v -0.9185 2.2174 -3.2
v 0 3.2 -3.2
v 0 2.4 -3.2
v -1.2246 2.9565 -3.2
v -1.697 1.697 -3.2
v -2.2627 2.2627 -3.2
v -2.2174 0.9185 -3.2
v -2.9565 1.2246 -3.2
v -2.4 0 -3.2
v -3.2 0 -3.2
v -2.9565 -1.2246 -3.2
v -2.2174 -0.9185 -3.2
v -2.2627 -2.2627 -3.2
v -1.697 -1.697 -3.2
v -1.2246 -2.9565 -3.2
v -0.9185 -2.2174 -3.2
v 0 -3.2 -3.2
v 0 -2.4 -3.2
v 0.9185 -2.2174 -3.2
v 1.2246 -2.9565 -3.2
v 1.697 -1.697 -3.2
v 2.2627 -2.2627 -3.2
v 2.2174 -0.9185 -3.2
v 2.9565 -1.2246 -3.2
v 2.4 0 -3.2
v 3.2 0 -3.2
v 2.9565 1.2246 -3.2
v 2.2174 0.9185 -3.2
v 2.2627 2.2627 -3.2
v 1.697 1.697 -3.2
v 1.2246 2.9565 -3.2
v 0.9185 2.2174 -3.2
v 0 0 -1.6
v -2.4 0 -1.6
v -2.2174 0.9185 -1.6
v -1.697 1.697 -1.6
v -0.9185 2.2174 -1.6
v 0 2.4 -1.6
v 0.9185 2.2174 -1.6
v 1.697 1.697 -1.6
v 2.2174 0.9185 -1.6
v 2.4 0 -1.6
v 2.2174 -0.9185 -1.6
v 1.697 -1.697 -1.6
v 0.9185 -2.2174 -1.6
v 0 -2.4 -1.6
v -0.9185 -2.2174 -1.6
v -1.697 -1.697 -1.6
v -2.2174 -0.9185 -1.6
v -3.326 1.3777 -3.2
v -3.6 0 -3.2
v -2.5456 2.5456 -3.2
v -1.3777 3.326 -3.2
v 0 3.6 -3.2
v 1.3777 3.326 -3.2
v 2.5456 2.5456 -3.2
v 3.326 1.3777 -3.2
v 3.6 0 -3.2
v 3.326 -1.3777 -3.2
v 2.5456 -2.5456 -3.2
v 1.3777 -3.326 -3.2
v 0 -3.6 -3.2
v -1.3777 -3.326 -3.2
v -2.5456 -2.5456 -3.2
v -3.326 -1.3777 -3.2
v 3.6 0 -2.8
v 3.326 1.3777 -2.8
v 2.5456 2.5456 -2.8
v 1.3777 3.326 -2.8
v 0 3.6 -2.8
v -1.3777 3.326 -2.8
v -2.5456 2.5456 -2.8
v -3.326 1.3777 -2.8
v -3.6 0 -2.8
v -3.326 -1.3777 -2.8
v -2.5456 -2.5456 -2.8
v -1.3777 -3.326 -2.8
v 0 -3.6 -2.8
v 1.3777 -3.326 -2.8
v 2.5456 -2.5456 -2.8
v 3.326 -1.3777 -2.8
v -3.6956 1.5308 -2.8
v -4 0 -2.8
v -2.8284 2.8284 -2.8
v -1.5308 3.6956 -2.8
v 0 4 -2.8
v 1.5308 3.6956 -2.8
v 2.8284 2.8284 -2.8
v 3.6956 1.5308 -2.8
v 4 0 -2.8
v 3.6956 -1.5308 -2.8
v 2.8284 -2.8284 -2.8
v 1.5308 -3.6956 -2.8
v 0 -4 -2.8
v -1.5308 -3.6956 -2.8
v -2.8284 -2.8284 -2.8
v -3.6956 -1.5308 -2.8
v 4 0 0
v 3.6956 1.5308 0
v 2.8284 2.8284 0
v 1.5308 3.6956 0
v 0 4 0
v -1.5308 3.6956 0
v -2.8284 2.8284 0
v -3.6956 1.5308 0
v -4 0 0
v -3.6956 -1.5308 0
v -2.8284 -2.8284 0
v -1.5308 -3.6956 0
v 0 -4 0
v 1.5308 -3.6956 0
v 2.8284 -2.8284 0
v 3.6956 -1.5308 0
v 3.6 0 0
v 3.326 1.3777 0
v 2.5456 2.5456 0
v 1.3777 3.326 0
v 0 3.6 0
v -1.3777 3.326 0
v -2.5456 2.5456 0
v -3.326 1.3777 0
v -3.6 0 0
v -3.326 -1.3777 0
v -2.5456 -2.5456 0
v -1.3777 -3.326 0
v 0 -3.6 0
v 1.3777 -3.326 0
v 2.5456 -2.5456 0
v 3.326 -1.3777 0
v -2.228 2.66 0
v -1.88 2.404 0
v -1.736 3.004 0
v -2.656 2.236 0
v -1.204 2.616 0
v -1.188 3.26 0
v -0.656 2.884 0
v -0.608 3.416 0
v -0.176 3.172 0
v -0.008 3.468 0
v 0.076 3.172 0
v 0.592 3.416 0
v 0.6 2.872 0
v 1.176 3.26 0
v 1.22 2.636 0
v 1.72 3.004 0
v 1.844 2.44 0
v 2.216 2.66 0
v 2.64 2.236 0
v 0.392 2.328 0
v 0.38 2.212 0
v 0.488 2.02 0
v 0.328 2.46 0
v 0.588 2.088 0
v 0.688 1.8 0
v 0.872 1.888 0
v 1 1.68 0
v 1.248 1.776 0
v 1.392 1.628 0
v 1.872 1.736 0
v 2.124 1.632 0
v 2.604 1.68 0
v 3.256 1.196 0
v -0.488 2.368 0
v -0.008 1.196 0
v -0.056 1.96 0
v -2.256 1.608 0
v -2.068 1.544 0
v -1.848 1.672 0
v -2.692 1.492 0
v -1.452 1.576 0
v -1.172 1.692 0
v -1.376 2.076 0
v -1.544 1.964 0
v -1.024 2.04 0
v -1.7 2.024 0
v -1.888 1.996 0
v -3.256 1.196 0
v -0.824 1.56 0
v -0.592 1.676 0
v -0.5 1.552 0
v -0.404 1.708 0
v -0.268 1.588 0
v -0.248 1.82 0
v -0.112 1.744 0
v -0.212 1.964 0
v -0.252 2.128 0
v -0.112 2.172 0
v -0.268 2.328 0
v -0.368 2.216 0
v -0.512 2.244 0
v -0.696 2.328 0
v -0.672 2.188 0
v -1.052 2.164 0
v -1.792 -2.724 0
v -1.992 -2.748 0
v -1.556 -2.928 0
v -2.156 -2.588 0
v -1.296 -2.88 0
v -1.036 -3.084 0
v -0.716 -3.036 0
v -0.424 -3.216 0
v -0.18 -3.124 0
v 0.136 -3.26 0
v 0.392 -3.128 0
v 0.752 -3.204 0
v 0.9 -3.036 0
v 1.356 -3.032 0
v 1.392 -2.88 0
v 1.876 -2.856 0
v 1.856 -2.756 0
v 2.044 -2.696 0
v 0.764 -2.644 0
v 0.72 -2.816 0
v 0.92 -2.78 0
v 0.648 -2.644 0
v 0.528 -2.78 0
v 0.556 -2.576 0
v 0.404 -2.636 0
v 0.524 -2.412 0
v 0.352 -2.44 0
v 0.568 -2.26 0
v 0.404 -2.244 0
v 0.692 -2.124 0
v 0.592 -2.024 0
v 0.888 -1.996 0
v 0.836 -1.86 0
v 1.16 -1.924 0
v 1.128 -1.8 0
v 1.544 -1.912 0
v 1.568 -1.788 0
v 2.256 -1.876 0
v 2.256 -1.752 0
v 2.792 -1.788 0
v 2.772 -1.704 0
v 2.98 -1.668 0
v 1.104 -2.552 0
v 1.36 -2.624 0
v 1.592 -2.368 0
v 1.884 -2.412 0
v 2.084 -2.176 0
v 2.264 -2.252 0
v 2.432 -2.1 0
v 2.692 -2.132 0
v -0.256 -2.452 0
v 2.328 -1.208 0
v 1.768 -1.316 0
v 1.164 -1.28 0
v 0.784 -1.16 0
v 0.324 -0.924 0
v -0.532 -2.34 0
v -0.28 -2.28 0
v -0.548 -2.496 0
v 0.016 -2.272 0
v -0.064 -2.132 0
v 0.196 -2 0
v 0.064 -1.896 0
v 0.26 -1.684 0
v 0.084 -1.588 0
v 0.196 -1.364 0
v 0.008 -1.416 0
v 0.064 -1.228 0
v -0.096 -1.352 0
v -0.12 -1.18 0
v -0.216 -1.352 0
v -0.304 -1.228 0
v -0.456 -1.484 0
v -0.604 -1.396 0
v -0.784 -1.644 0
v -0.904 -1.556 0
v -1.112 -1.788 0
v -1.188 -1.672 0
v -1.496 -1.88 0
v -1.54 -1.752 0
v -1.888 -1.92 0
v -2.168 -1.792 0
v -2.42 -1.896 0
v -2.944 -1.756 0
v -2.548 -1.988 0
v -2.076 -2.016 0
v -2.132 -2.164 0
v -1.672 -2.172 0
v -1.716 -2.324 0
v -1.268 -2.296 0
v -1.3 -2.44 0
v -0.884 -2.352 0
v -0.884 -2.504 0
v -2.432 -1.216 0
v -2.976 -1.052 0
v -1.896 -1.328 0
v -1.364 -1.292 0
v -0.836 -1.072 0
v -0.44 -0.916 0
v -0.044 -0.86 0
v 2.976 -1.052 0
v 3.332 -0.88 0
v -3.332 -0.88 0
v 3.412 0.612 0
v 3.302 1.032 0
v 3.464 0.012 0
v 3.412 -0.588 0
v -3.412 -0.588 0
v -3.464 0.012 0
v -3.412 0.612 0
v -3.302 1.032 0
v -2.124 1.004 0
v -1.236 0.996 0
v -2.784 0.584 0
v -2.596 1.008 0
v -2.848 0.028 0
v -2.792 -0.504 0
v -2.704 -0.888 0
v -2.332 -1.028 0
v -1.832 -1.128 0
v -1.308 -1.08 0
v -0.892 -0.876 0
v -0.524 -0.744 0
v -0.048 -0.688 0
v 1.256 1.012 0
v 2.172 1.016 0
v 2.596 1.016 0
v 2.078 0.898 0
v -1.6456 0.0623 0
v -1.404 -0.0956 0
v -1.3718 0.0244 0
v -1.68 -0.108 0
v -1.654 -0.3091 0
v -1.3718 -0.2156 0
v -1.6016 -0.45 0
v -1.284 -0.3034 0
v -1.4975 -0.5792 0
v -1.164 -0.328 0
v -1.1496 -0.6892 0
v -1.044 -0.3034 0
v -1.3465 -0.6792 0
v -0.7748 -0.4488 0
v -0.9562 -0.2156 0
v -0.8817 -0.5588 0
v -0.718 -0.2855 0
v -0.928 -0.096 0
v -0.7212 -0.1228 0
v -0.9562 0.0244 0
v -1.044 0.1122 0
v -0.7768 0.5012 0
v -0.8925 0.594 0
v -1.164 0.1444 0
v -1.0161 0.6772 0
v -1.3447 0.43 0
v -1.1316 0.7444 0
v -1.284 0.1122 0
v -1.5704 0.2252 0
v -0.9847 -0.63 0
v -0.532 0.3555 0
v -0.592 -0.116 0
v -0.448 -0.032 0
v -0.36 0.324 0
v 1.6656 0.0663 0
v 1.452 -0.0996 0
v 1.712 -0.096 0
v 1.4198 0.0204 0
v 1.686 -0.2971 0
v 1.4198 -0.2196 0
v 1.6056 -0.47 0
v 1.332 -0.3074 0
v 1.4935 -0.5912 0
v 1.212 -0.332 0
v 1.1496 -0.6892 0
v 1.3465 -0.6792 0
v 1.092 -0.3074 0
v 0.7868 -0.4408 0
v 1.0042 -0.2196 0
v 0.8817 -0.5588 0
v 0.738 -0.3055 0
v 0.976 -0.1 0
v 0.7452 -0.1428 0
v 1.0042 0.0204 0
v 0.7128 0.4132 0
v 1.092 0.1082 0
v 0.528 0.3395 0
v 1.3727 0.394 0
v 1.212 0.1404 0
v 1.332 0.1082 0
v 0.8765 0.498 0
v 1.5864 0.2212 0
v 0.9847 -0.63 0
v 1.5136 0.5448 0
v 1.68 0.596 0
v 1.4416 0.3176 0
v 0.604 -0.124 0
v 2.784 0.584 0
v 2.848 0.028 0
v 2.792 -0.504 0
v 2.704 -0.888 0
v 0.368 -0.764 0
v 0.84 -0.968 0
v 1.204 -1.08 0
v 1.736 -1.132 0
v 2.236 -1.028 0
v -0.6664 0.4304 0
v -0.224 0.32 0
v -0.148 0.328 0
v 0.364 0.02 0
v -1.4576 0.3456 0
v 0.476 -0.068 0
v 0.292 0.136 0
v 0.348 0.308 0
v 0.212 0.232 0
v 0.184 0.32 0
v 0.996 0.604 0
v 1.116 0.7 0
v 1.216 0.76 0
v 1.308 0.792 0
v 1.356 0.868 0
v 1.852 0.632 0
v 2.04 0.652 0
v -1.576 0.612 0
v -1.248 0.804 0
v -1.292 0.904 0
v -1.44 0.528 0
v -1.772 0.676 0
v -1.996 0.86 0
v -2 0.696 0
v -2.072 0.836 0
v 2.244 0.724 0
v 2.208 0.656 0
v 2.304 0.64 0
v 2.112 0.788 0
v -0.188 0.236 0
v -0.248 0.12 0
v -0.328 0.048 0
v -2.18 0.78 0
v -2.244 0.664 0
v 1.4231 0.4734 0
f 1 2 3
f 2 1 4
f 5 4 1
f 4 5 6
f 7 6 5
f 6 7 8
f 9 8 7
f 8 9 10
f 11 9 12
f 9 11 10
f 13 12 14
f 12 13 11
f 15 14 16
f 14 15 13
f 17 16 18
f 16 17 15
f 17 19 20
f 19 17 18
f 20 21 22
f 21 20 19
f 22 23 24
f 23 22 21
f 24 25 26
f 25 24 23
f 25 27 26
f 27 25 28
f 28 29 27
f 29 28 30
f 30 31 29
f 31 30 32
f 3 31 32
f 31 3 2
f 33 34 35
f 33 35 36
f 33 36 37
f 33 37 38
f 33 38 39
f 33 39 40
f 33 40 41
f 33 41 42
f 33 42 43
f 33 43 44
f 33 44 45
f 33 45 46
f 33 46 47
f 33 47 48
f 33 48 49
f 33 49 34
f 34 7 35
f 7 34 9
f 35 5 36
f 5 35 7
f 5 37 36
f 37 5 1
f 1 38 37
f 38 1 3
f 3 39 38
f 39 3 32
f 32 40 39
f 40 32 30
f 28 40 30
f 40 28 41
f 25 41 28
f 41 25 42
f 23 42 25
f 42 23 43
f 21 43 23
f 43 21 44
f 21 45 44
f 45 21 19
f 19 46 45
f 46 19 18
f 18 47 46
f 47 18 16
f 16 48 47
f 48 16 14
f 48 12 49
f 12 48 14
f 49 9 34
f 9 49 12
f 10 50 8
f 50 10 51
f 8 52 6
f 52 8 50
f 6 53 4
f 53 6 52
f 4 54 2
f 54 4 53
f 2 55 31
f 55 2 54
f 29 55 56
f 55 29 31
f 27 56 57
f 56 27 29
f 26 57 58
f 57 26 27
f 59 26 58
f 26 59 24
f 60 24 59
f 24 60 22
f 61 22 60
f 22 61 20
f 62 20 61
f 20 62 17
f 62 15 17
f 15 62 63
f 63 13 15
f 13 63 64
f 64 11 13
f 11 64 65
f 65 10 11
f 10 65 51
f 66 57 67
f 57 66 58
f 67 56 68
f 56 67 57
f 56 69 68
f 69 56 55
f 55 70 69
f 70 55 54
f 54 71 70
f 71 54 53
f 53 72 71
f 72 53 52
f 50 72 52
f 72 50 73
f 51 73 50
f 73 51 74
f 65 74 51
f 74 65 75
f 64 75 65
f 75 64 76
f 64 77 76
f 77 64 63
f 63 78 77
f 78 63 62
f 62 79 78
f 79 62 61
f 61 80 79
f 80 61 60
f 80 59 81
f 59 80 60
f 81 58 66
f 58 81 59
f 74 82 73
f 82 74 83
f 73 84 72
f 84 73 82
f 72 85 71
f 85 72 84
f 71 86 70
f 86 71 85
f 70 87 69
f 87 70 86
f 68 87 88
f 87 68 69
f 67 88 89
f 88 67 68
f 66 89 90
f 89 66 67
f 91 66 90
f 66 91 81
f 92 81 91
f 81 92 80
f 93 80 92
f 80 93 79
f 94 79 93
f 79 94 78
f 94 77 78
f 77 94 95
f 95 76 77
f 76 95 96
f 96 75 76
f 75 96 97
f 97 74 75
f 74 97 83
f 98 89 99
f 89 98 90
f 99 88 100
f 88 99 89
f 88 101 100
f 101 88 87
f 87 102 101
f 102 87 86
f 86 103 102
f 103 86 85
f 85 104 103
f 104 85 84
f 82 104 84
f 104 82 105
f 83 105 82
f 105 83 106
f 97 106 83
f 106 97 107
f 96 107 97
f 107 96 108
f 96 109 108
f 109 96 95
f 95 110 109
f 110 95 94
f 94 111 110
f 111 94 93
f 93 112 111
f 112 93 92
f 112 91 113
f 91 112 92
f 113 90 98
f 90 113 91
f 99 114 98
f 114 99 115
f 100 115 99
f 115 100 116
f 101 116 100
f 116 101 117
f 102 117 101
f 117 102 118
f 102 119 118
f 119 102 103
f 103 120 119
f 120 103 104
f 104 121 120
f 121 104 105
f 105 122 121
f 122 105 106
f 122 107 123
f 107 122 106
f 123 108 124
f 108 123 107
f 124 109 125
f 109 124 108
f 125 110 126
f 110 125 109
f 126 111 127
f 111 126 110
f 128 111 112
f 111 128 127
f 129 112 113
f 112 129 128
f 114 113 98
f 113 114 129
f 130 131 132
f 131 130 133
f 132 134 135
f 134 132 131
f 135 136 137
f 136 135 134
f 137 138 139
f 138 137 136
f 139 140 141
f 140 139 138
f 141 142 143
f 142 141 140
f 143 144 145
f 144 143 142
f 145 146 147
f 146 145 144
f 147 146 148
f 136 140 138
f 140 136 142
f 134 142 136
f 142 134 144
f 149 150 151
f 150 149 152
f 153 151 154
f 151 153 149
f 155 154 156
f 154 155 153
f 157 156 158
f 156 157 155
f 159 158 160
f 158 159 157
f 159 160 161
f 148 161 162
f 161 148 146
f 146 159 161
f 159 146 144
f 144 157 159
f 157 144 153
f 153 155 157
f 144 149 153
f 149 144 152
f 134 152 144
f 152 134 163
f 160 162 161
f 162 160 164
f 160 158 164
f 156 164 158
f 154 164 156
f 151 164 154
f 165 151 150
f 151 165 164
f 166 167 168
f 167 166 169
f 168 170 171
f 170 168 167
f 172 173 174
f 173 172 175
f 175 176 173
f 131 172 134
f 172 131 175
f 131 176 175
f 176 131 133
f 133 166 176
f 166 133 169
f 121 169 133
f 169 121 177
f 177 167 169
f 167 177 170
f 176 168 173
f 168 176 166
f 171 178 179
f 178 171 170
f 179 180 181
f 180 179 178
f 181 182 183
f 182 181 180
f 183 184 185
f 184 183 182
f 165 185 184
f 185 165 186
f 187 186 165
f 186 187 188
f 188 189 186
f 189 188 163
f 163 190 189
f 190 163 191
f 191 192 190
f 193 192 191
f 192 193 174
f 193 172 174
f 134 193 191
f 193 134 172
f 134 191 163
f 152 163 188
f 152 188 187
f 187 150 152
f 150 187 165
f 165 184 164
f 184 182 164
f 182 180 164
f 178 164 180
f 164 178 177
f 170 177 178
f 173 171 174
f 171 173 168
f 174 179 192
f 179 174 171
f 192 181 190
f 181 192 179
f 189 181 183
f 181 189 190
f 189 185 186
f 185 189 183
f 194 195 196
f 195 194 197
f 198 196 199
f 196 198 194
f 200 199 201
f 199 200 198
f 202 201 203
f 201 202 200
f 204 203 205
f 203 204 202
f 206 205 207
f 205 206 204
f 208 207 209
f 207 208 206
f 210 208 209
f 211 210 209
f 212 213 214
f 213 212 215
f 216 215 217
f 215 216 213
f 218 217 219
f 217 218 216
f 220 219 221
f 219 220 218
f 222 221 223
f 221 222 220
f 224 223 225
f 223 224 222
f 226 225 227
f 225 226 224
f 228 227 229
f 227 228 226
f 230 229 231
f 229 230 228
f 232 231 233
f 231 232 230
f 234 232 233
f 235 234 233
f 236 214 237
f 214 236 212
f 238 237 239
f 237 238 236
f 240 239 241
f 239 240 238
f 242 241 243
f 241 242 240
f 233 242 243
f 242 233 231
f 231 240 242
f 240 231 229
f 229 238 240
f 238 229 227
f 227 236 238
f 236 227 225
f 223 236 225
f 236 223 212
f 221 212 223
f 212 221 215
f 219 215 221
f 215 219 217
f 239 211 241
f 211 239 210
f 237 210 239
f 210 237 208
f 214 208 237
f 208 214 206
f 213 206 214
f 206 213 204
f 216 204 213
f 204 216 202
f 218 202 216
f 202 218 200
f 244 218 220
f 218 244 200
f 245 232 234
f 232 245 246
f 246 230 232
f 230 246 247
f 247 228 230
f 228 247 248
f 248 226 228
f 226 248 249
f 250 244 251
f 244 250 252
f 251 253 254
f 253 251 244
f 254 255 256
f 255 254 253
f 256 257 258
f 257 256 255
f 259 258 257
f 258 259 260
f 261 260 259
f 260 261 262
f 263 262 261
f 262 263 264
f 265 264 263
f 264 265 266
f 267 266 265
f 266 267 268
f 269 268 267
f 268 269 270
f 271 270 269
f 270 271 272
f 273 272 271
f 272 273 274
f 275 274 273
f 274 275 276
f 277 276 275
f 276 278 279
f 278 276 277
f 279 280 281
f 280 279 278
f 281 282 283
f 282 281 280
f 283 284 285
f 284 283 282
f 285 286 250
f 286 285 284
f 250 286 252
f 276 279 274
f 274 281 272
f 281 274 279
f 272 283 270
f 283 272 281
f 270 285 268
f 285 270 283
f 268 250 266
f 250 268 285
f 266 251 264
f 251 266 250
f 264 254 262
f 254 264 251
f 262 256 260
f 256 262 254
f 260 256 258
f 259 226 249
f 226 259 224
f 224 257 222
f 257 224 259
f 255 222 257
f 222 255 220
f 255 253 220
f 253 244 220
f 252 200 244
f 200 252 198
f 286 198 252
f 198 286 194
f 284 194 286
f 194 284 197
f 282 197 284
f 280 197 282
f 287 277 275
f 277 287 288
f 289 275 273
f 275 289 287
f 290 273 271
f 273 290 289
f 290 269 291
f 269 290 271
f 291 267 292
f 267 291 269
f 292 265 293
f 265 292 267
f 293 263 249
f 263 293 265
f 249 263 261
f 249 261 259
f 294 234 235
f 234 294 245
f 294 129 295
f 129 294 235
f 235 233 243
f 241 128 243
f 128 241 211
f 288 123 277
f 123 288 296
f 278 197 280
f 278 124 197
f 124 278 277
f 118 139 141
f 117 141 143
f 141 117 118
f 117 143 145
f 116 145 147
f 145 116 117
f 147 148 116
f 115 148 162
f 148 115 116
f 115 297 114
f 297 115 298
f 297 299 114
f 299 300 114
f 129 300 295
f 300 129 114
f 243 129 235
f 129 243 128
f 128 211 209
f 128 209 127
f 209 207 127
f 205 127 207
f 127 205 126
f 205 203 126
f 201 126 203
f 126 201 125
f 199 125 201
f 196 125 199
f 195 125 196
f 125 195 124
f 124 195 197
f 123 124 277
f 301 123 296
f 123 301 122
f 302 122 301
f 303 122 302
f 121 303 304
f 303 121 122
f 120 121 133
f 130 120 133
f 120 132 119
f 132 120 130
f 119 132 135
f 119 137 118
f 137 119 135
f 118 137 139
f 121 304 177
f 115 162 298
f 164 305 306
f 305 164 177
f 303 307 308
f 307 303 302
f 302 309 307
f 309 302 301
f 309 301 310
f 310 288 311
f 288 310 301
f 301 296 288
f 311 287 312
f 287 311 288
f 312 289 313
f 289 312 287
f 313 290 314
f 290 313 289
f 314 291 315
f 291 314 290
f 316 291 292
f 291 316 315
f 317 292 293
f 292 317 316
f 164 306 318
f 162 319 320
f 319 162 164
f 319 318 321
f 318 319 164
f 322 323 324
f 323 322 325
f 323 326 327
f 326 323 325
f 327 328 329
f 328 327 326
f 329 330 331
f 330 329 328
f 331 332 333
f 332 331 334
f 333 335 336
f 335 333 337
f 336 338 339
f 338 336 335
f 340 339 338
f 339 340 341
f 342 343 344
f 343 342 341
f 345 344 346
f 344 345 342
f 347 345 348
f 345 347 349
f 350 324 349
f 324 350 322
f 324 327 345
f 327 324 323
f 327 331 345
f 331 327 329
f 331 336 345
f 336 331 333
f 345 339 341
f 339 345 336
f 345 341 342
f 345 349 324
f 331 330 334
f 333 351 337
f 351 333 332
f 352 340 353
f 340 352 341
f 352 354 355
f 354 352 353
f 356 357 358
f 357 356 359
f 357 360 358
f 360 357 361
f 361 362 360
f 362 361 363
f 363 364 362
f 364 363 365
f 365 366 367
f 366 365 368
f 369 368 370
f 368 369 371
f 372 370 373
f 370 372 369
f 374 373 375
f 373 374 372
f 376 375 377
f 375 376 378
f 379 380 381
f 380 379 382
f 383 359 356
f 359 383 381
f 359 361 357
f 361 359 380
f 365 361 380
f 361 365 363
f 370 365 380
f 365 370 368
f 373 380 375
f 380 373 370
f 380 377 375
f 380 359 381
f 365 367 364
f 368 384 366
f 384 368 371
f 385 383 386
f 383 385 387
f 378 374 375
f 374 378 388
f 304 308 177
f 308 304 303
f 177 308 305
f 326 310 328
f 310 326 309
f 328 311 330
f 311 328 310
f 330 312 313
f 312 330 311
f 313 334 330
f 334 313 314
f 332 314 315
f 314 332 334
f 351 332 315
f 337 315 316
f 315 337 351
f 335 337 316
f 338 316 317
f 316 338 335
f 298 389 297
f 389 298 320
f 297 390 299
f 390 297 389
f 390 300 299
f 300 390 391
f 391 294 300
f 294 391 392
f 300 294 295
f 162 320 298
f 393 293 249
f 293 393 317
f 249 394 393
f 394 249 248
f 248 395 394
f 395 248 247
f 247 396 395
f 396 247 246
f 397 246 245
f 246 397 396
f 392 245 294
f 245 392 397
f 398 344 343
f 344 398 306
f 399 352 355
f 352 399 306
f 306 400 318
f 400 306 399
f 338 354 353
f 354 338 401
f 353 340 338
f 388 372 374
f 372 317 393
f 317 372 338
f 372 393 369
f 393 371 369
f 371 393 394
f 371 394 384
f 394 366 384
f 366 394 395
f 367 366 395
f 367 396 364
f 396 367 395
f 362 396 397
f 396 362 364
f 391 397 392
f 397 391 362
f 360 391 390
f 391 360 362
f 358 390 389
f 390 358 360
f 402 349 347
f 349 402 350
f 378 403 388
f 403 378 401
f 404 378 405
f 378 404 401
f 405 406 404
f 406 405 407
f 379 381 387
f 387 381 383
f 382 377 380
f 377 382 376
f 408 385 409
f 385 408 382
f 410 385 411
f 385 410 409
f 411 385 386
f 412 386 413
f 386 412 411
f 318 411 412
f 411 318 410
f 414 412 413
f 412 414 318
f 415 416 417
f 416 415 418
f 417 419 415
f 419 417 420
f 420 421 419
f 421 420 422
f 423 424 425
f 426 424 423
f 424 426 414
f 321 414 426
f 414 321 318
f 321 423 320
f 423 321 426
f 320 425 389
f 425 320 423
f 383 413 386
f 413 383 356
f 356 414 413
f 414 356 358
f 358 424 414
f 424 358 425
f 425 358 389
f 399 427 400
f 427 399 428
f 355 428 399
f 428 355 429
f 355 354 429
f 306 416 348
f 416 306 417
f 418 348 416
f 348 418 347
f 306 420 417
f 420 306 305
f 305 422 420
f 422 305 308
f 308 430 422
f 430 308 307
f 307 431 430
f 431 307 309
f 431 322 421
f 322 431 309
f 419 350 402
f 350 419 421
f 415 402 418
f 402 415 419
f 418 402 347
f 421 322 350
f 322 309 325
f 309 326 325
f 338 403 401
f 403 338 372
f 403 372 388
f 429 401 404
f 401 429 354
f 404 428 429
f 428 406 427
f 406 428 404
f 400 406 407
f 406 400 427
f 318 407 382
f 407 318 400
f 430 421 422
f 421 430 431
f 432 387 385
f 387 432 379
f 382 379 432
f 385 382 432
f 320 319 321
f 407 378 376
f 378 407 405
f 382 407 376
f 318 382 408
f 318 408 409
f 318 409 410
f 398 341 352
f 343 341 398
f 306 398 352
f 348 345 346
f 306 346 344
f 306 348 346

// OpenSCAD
use <../lib.scad>
use <../p/4-4ering.scad>
use <s/98138pn0s01.scad>
use <s/98138s01.scad>
function ldraw_lib__98138pn5() = [
// 0 Tile  1 x  1 Round with Ninjago Trapped Lloyd Patternn
// 0 Name: 98138pn5.dat
// 0 Author: Gerald Lasser [GeraldLasser]
// 0 !LDRAW_ORG Part UPDATE 2017-01
// 0 !LICENSE Licensed under CC BY 2.0 and CC BY 4.0 : see CAreadme.txt
// 
// 0 BFC CERTIFY CCW
  [0,"BFC","CERTIFY"],
  [0,"BFC","CCW"],
// 
// 0 !KEYWORDS BrickLink 98138pb047
// 
// 0 !HISTORY 2017-12-30 [PTadmin] Official Update 2017-01
// 
// 
// 1 16 0 0 0 1 0 0 0 1 0 0 0 1 s\98138s01.dat
  [1,16,0,0,0,1,0,0,0,1,0,0,0,1, ldraw_lib__s__98138s01()],
// 1 16 0 0 0 9 0 0 0 1 0 0 0 9 4-4ering.dat
  [1,16,0,0,0,9,0,0,0,1,0,0,0,9, ldraw_lib__4_4ering()],
// 1 16 0 0 0 1 0 0 0 1 0 0 0 1 s\98138pn0s01.dat
  [1,16,0,0,0,1,0,0,0,1,0,0,0,1, ldraw_lib__s__98138pn0s01()],
// 4 0 -5.31 0 2.51 -3.09 0 2.49 -0.02 0 2.99 -8.14 0 2.99
  [4,0,-5.31,0,2.51,-3.09,0,2.49,-0.02,0,2.99,-8.14,0,2.99],
// 4 0 -6.96 0 1.46 -6.49 0 2.52 -8.53 0 1.53 -8.66 0 0.03
  [4,0,-6.96,0,1.46,-6.49,0,2.52,-8.53,0,1.53,-8.66,0,0.03],
// 4 0 -7.12 0 0.07 -6.96 0 1.46 -8.66 0 0.03 -8.53 0 -1.47
  [4,0,-7.12,0,0.07,-6.96,0,1.46,-8.66,0,0.03,-8.53,0,-1.47],
// 3 0 -7.12 0 0.07 -8.53 0 -1.47 -6.98 0 -1.26
  [3,0,-7.12,0,0.07,-8.53,0,-1.47,-6.98,0,-1.26],
// 4 0 -6.76 0 -2.22 -6.98 0 -1.26 -8.53 0 -1.47 -7.44 0 -2.63
  [4,0,-6.76,0,-2.22,-6.98,0,-1.26,-8.53,0,-1.47,-7.44,0,-2.63],
// 3 0 -8.53 0 -1.47 -8.33 0 -2.2 -7.44 0 -2.63
  [3,0,-8.53,0,-1.47,-8.33,0,-2.2,-7.44,0,-2.63],
// 4 0 -6.08 0 -3.04 -5.83 0 -2.57 -6.76 0 -2.22 -7.44 0 -2.63
  [4,0,-6.08,0,-3.04,-5.83,0,-2.57,-6.76,0,-2.22,-7.44,0,-2.63],
// 4 0 -4.74 0 -3.32 -4.58 0 -2.82 -5.83 0 -2.57 -6.08 0 -3.04
  [4,0,-4.74,0,-3.32,-4.58,0,-2.82,-5.83,0,-2.57,-6.08,0,-3.04],
// 4 0 -3.41 0 -3.23 -3.27 0 -2.7 -4.58 0 -2.82 -4.74 0 -3.32
  [4,0,-3.41,0,-3.23,-3.27,0,-2.7,-4.58,0,-2.82,-4.74,0,-3.32],
// 4 0 -2.09 0 -2.68 -2.23 0 -2.19 -3.27 0 -2.7 -3.41 0 -3.23
  [4,0,-2.09,0,-2.68,-2.23,0,-2.19,-3.27,0,-2.7,-3.41,0,-3.23],
// 4 0 -1.1 0 -2.29 -1.31 0 -1.86 -2.23 0 -2.19 -2.09 0 -2.68
  [4,0,-1.1,0,-2.29,-1.31,0,-1.86,-2.23,0,-2.19,-2.09,0,-2.68],
// 4 0 -0.11 0 -2.15 -0.12 0 -1.72 -1.31 0 -1.86 -1.1 0 -2.29
  [4,0,-0.11,0,-2.15,-0.12,0,-1.72,-1.31,0,-1.86,-1.1,0,-2.29],
// 3 0 -0.02 0 2.99 -3.09 0 2.49 3.14 0 2.53
  [3,0,-0.02,0,2.99,-3.09,0,2.49,3.14,0,2.53],
// 4 0 5.43 0 2.54 6.49 0 2.54 8.14 0 2.99 -0.02 0 2.99
  [4,0,5.43,0,2.54,6.49,0,2.54,8.14,0,2.99,-0.02,0,2.99],
// 4 0 5.43 0 2.54 -0.02 0 2.99 3.14 0 2.53 5.195 0 2.245
  [4,0,5.43,0,2.54,-0.02,0,2.99,3.14,0,2.53,5.195,0,2.245],
// 4 0 -3.51 0 -0.239 -3.4296 0 0.061 -4.1139 0 0.1557 -4.2 0 -0.27
  [4,0,-3.51,0,-0.239,-3.4296,0,0.061,-4.1139,0,0.1557,-4.2,0,-0.27],
// 4 0 -3.4296 0 -0.539 -3.51 0 -0.239 -4.2 0 -0.27 -4.1349 0 -0.7727
  [4,0,-3.4296,0,-0.539,-3.51,0,-0.239,-4.2,0,-0.27,-4.1349,0,-0.7727],
// 4 0 -3.21 0 -0.7586 -3.4296 0 -0.539 -4.1349 0 -0.7727 -4.0041 0 -1.1251
  [4,0,-3.21,0,-0.7586,-3.4296,0,-0.539,-4.1349,0,-0.7727,-4.0041,0,-1.1251],
// 4 0 -3.21 0 -0.7586 -4.0041 0 -1.1251 -3.7437 0 -1.4479 -2.91 0 -0.82
  [4,0,-3.21,0,-0.7586,-4.0041,0,-1.1251,-3.7437,0,-1.4479,-2.91,0,-0.82],
// 4 0 -2.874 0 -1.723 -2.61 0 -0.7586 -2.91 0 -0.82 -3.3663 0 -1.6979
  [4,0,-2.874,0,-1.723,-2.61,0,-0.7586,-2.91,0,-0.82,-3.3663,0,-1.6979],
// 4 0 -2.3904 0 -0.539 -2.61 0 -0.7586 -2.2043 0 -1.3969 -1.9369 0 -1.1221
  [4,0,-2.3904,0,-0.539,-2.61,0,-0.7586,-2.2043,0,-1.3969,-1.9369,0,-1.1221],
// 4 0 -2.3904 0 -0.539 -1.9369 0 -1.1221 -1.7951 0 -0.7137 -2.32 0 -0.24
  [4,0,-2.3904,0,-0.539,-1.9369,0,-1.1221,-1.7951,0,-0.7137,-2.32,0,-0.24],
// 4 0 -2.32 0 -0.24 -1.7951 0 -0.7137 -1.803 0 -0.307 -2.3904 0 0.061
  [4,0,-2.32,0,-0.24,-1.7951,0,-0.7137,-1.803,0,-0.307,-2.3904,0,0.061],
// 4 0 -2.61 0 0.2806 -2.3904 0 0.061 -1.9419 0 1.2531 -2.2313 0 1.4849
  [4,0,-2.61,0,0.2806,-2.3904,0,0.061,-1.9419,0,1.2531,-2.2313,0,1.4849],
// 4 0 -2.91 0 0.361 -2.61 0 0.2806 -2.2313 0 1.4849 -2.5402 0 1.6929
  [4,0,-2.91,0,0.361,-2.61,0,0.2806,-2.2313,0,1.4849,-2.5402,0,1.6929],
// 4 0 -3.21 0 0.2806 -2.91 0 0.361 -2.829 0 1.861 -3.3617 0 1.0749
  [4,0,-3.21,0,0.2806,-2.91,0,0.361,-2.829,0,1.861,-3.3617,0,1.0749],
// 4 0 -3.4296 0 0.061 -3.21 0 0.2806 -3.9261 0 0.5631 -4.1139 0 0.1557
  [4,0,-3.4296,0,0.061,-3.21,0,0.2806,-3.9261,0,0.5631,-4.1139,0,0.1557],
// 4 14 -2.91 0 0.361 -3.4296 0 0.061 -3.51 0 -0.239 -3.4296 0 -0.539
  [4,14,-2.91,0,0.361,-3.4296,0,0.061,-3.51,0,-0.239,-3.4296,0,-0.539],
// 4 14 -2.91 0 0.361 -3.4296 0 -0.539 -3.21 0 -0.7586 -2.91 0 -0.82
  [4,14,-2.91,0,0.361,-3.4296,0,-0.539,-3.21,0,-0.7586,-2.91,0,-0.82],
// 4 14 -2.91 0 0.361 -2.91 0 -0.82 -2.61 0 -0.7586 -2.3904 0 -0.539
  [4,14,-2.91,0,0.361,-2.91,0,-0.82,-2.61,0,-0.7586,-2.3904,0,-0.539],
// 4 14 -2.91 0 0.361 -2.3904 0 -0.539 -2.32 0 -0.24 -2.3904 0 0.061
  [4,14,-2.91,0,0.361,-2.3904,0,-0.539,-2.32,0,-0.24,-2.3904,0,0.061],
// 3 14 -2.91 0 0.361 -2.3904 0 0.061 -2.61 0 0.2806
  [3,14,-2.91,0,0.361,-2.3904,0,0.061,-2.61,0,0.2806],
// 3 14 -2.91 0 0.361 -3.21 0 0.2806 -3.4296 0 0.061
  [3,14,-2.91,0,0.361,-3.21,0,0.2806,-3.4296,0,0.061],
// 3 0 -2.91 0 -0.82 -3.7437 0 -1.4479 -3.3663 0 -1.6979
  [3,0,-2.91,0,-0.82,-3.7437,0,-1.4479,-3.3663,0,-1.6979],
// 4 0 -2.61 0 -0.7586 -2.874 0 -1.723 -2.4617 0 -1.5749 -2.2043 0 -1.3969
  [4,0,-2.61,0,-0.7586,-2.874,0,-1.723,-2.4617,0,-1.5749,-2.2043,0,-1.3969],
// 4 0 -1.3301 0 0.8887 -2.3904 0 0.061 -1.803 0 -0.307 -1.48 0 -0.29
  [4,0,-1.3301,0,0.8887,-2.3904,0,0.061,-1.803,0,-0.307,-1.48,0,-0.29],
// 4 0 -1.3301 0 0.8887 -1.48 0 -0.29 -1.12 0 -0.08 -0.9 0 0.81
  [4,0,-1.3301,0,0.8887,-1.48,0,-0.29,-1.12,0,-0.08,-0.9,0,0.81],
// 4 0 4.1639 0 0.1657 3.5496 0 0.051 3.63 0 -0.249 4.28 0 -0.24
  [4,0,4.1639,0,0.1657,3.5496,0,0.051,3.63,0,-0.249,4.28,0,-0.24],
// 4 0 4.28 0 -0.24 3.63 0 -0.249 3.5496 0 -0.549 4.2149 0 -0.7427
  [4,0,4.28,0,-0.24,3.63,0,-0.249,3.5496,0,-0.549,4.2149,0,-0.7427],
// 4 0 4.2149 0 -0.7427 3.5496 0 -0.549 3.33 0 -0.7686 4.0141 0 -1.1751
  [4,0,4.2149,0,-0.7427,3.5496,0,-0.549,3.33,0,-0.7686,4.0141,0,-1.1751],
// 4 0 3.7337 0 -1.4779 4.0141 0 -1.1751 3.33 0 -0.7686 3.03 0 -0.83
  [4,0,3.7337,0,-1.4779,4.0141,0,-1.1751,3.33,0,-0.7686,3.03,0,-0.83],
// 4 0 3.03 0 -0.83 2.73 0 -0.7686 2.874 0 -1.723 3.3663 0 -1.6979
  [4,0,3.03,0,-0.83,2.73,0,-0.7686,2.874,0,-1.723,3.3663,0,-1.6979],
// 4 0 2.2043 0 -1.3969 2.73 0 -0.7686 2.5104 0 -0.549 1.9669 0 -1.1021
  [4,0,2.2043,0,-1.3969,2.73,0,-0.7686,2.5104,0,-0.549,1.9669,0,-1.1021],
// 4 0 1.8451 0 -0.7637 1.9669 0 -1.1021 2.5104 0 -0.549 2.44 0 -0.25
  [4,0,1.8451,0,-0.7637,1.9669,0,-1.1021,2.5104,0,-0.549,2.44,0,-0.25],
// 4 0 1.863 0 -0.357 1.8451 0 -0.7637 2.44 0 -0.25 2.5104 0 0.051
  [4,0,1.863,0,-0.357,1.8451,0,-0.7637,2.44,0,-0.25,2.5104,0,0.051],
// 4 0 1.7819 0 1.0331 1.3201 0 0.8487 2.5104 0 0.051 2.73 0 0.2706
  [4,0,1.7819,0,1.0331,1.3201,0,0.8487,2.5104,0,0.051,2.73,0,0.2706],
// 4 0 2.1913 0 1.2449 3.03 0 0.351 3.33 0 0.2706 3.4317 0 0.9849
  [4,0,2.1913,0,1.2449,3.03,0,0.351,3.33,0,0.2706,3.4317,0,0.9849],
// 4 0 3.9661 0 0.5531 3.33 0 0.2706 3.5496 0 0.051 4.1639 0 0.1657
  [4,0,3.9661,0,0.5531,3.33,0,0.2706,3.5496,0,0.051,4.1639,0,0.1657],
// 4 14 3.63 0 -0.249 3.5496 0 0.051 3.03 0 0.351 3.5496 0 -0.549
  [4,14,3.63,0,-0.249,3.5496,0,0.051,3.03,0,0.351,3.5496,0,-0.549],
// 4 14 3.33 0 -0.7686 3.5496 0 -0.549 3.03 0 0.351 3.03 0 -0.83
  [4,14,3.33,0,-0.7686,3.5496,0,-0.549,3.03,0,0.351,3.03,0,-0.83],
// 4 14 2.73 0 -0.7686 3.03 0 -0.83 3.03 0 0.351 2.5104 0 -0.549
  [4,14,2.73,0,-0.7686,3.03,0,-0.83,3.03,0,0.351,2.5104,0,-0.549],
// 4 14 2.44 0 -0.25 2.5104 0 -0.549 3.03 0 0.351 2.5104 0 0.051
  [4,14,2.44,0,-0.25,2.5104,0,-0.549,3.03,0,0.351,2.5104,0,0.051],
// 3 14 3.03 0 0.351 2.73 0 0.2706 2.5104 0 0.051
  [3,14,3.03,0,0.351,2.73,0,0.2706,2.5104,0,0.051],
// 3 14 3.03 0 0.351 3.5496 0 0.051 3.33 0 0.2706
  [3,14,3.03,0,0.351,3.5496,0,0.051,3.33,0,0.2706],
// 3 0 3.03 0 -0.83 3.3663 0 -1.6979 3.7337 0 -1.4779
  [3,0,3.03,0,-0.83,3.3663,0,-1.6979,3.7337,0,-1.4779],
// 4 0 2.4617 0 -1.5749 2.874 0 -1.723 2.73 0 -0.7686 2.2043 0 -1.3969
  [4,0,2.4617,0,-1.5749,2.874,0,-1.723,2.73,0,-0.7686,2.2043,0,-1.3969],
// 4 14 3.9661 0 0.5531 4.2 0 1.49 3.784 0 1.362 3.6039 0 0.794
  [4,14,3.9661,0,0.5531,4.2,0,1.49,3.784,0,1.362,3.6039,0,0.794],
// 4 0 1.863 0 -0.357 2.5104 0 0.051 1.3201 0 0.8487 1.51 0 -0.31
  [4,0,1.863,0,-0.357,2.5104,0,0.051,1.3201,0,0.8487,1.51,0,-0.31],
// 4 0 -6.49 0 2.52 -8.14 0 2.99 -8.255 0 2.58 -8.53 0 1.53
  [4,0,-6.49,0,2.52,-8.14,0,2.99,-8.255,0,2.58,-8.53,0,1.53],
// 3 0 -8.14 0 2.99 -6.49 0 2.52 -5.31 0 2.51
  [3,0,-8.14,0,2.99,-6.49,0,2.52,-5.31,0,2.51],
// 4 14 -4.1349 0 -0.7727 -7.12 0 0.07 -6.98 0 -1.26 -4.0041 0 -1.1251
  [4,14,-4.1349,0,-0.7727,-7.12,0,0.07,-6.98,0,-1.26,-4.0041,0,-1.1251],
// 4 14 -4.0041 0 -1.1251 -6.98 0 -1.26 -6.76 0 -2.22 -3.7437 0 -1.4479
  [4,14,-4.0041,0,-1.1251,-6.98,0,-1.26,-6.76,0,-2.22,-3.7437,0,-1.4479],
// 4 14 -3.7437 0 -1.4479 -6.76 0 -2.22 -5.83 0 -2.57 -4.58 0 -2.82
  [4,14,-3.7437,0,-1.4479,-6.76,0,-2.22,-5.83,0,-2.57,-4.58,0,-2.82],
// 4 14 -3.3663 0 -1.6979 -3.7437 0 -1.4479 -4.58 0 -2.82 -3.27 0 -2.7
  [4,14,-3.3663,0,-1.6979,-3.7437,0,-1.4479,-4.58,0,-2.82,-3.27,0,-2.7],
// 4 14 -2.874 0 -1.723 -3.3663 0 -1.6979 -3.27 0 -2.7 -2.23 0 -2.19
  [4,14,-2.874,0,-1.723,-3.3663,0,-1.6979,-3.27,0,-2.7,-2.23,0,-2.19],
// 3 14 -2.4617 0 -1.5749 -2.874 0 -1.723 -2.23 0 -2.19
  [3,14,-2.4617,0,-1.5749,-2.874,0,-1.723,-2.23,0,-2.19],
// 4 14 -2.2043 0 -1.3969 -2.4617 0 -1.5749 -2.23 0 -2.19 -1.31 0 -1.86
  [4,14,-2.2043,0,-1.3969,-2.4617,0,-1.5749,-2.23,0,-2.19,-1.31,0,-1.86],
// 3 14 -1.9369 0 -1.1221 -2.2043 0 -1.3969 -1.31 0 -1.86
  [3,14,-1.9369,0,-1.1221,-2.2043,0,-1.3969,-1.31,0,-1.86],
// 4 14 -1.7951 0 -0.7137 -1.9369 0 -1.1221 -1.31 0 -1.86 -0.12 0 -1.72
  [4,14,-1.7951,0,-0.7137,-1.9369,0,-1.1221,-1.31,0,-1.86,-0.12,0,-1.72],
// 4 0 8.53 0 1.53 8.255 0 2.58 6.49 0 2.54 6.96 0 1.46
  [4,0,8.53,0,1.53,8.255,0,2.58,6.49,0,2.54,6.96,0,1.46],
// 4 0 8.66 0 0.03 8.53 0 1.53 6.96 0 1.46 7.12 0 0.07
  [4,0,8.66,0,0.03,8.53,0,1.53,6.96,0,1.46,7.12,0,0.07],
// 4 0 8.53 0 -1.47 8.66 0 0.03 7.12 0 0.07 6.98 0 -1.26
  [4,0,8.53,0,-1.47,8.66,0,0.03,7.12,0,0.07,6.98,0,-1.26],
// 4 0 8.53 0 -1.47 6.98 0 -1.26 6.76 0 -2.22 7.44 0 -2.63
  [4,0,8.53,0,-1.47,6.98,0,-1.26,6.76,0,-2.22,7.44,0,-2.63],
// 3 0 8.53 0 -1.47 7.44 0 -2.63 8.33 0 -2.2
  [3,0,8.53,0,-1.47,7.44,0,-2.63,8.33,0,-2.2],
// 3 0 8.14 0 2.99 6.49 0 2.54 8.255 0 2.58
  [3,0,8.14,0,2.99,6.49,0,2.54,8.255,0,2.58],
// 4 0 0.92 0 -1.91 -0.12 0 -1.72 -0.11 0 -2.15 0.81 0 -2.31
  [4,0,0.92,0,-1.91,-0.12,0,-1.72,-0.11,0,-2.15,0.81,0,-2.31],
// 4 0 2.1 0 -2.42 0.92 0 -1.91 0.81 0 -2.31 1.96 0 -2.9
  [4,0,2.1,0,-2.42,0.92,0,-1.91,0.81,0,-2.31,1.96,0,-2.9],
// 4 0 3.01 0 -2.7 2.1 0 -2.42 1.96 0 -2.9 2.91 0 -3.2
  [4,0,3.01,0,-2.7,2.1,0,-2.42,1.96,0,-2.9,2.91,0,-3.2],
// 4 0 4.34 0 -2.83 3.01 0 -2.7 2.91 0 -3.2 4.42 0 -3.29
  [4,0,4.34,0,-2.83,3.01,0,-2.7,2.91,0,-3.2,4.42,0,-3.29],
// 4 0 5.59 0 -2.57 4.34 0 -2.83 4.42 0 -3.29 5.82 0 -3.02
  [4,0,5.59,0,-2.57,4.34,0,-2.83,4.42,0,-3.29,5.82,0,-3.02],
// 4 0 5.82 0 -3.02 7.44 0 -2.63 6.76 0 -2.22 5.59 0 -2.57
  [4,0,5.82,0,-3.02,7.44,0,-2.63,6.76,0,-2.22,5.59,0,-2.57],
// 4 14 -3.09 0 2.49 -2.2313 0 1.4849 -1.9419 0 1.2531 -1.666 0 1.0759
  [4,14,-3.09,0,2.49,-2.2313,0,1.4849,-1.9419,0,1.2531,-1.666,0,1.0759],
// 4 14 -3.09 0 2.49 -1.3301 0 0.8887 -0.9 0 0.81 -0.56 0 0.8
  [4,14,-3.09,0,2.49,-1.3301,0,0.8887,-0.9,0,0.81,-0.56,0,0.8],
// 4 14 -3.09 0 2.49 -0.56 0 0.8 -0.37 0 0.82 3.14 0 2.53
  [4,14,-3.09,0,2.49,-0.56,0,0.8,-0.37,0,0.82,3.14,0,2.53],
// 4 14 -1.12 0 -0.08 -1.48 0 -0.29 -1.7951 0 -0.7137 0.91 0 0.05
  [4,14,-1.12,0,-0.08,-1.48,0,-0.29,-1.7951,0,-0.7137,0.91,0,0.05],
// 3 14 -1.48 0 -0.29 -1.803 0 -0.307 -1.7951 0 -0.7137
  [3,14,-1.48,0,-0.29,-1.803,0,-0.307,-1.7951,0,-0.7137],
// 3 14 1.51 0 -0.31 1.8451 0 -0.7637 1.863 0 -0.357
  [3,14,1.51,0,-0.31,1.8451,0,-0.7637,1.863,0,-0.357],
// 4 14 1.8451 0 -0.7637 -1.7951 0 -0.7137 -0.12 0 -1.72 0.92 0 -1.91
  [4,14,1.8451,0,-0.7637,-1.7951,0,-0.7137,-0.12,0,-1.72,0.92,0,-1.91],
// 3 14 1.8451 0 -0.7637 0.92 0 -1.91 1.9669 0 -1.1021
  [3,14,1.8451,0,-0.7637,0.92,0,-1.91,1.9669,0,-1.1021],
// 4 14 2.2043 0 -1.3969 1.9669 0 -1.1021 0.92 0 -1.91 2.1 0 -2.42
  [4,14,2.2043,0,-1.3969,1.9669,0,-1.1021,0.92,0,-1.91,2.1,0,-2.42],
// 3 14 2.2043 0 -1.3969 2.1 0 -2.42 2.4617 0 -1.5749
  [3,14,2.2043,0,-1.3969,2.1,0,-2.42,2.4617,0,-1.5749],
// 4 14 2.874 0 -1.723 2.4617 0 -1.5749 2.1 0 -2.42 3.01 0 -2.7
  [4,14,2.874,0,-1.723,2.4617,0,-1.5749,2.1,0,-2.42,3.01,0,-2.7],
// 3 14 3.3663 0 -1.6979 2.874 0 -1.723 3.01 0 -2.7
  [3,14,3.3663,0,-1.6979,2.874,0,-1.723,3.01,0,-2.7],
// 4 14 3.7337 0 -1.4779 3.3663 0 -1.6979 3.01 0 -2.7 4.34 0 -2.83
  [4,14,3.7337,0,-1.4779,3.3663,0,-1.6979,3.01,0,-2.7,4.34,0,-2.83],
// 4 14 3.7337 0 -1.4779 4.34 0 -2.83 5.59 0 -2.57 4.0141 0 -1.1751
  [4,14,3.7337,0,-1.4779,4.34,0,-2.83,5.59,0,-2.57,4.0141,0,-1.1751],
// 4 14 4.0141 0 -1.1751 5.59 0 -2.57 6.76 0 -2.22 6.98 0 -1.26
  [4,14,4.0141,0,-1.1751,5.59,0,-2.57,6.76,0,-2.22,6.98,0,-1.26],
// 4 14 4.2149 0 -0.7427 4.0141 0 -1.1751 6.98 0 -1.26 7.12 0 0.07
  [4,14,4.2149,0,-0.7427,4.0141,0,-1.1751,6.98,0,-1.26,7.12,0,0.07],
// 4 14 4.28 0 -0.24 4.2149 0 -0.7427 7.12 0 0.07 6.96 0 1.46
  [4,14,4.28,0,-0.24,4.2149,0,-0.7427,7.12,0,0.07,6.96,0,1.46],
// 4 0 -3.6439 0 0.864 -3.9261 0 0.5631 -3.21 0 0.2806 -3.3617 0 1.0749
  [4,0,-3.6439,0,0.864,-3.9261,0,0.5631,-3.21,0,0.2806,-3.3617,0,1.0749],
// 4 0 1.19 0 -0.17 1.51 0 -0.31 1.3201 0 0.8487 0.91 0 0.05
  [4,0,1.19,0,-0.17,1.51,0,-0.31,1.3201,0,0.8487,0.91,0,0.05],
// 4 0 0.73 0 0.34 0.91 0 0.05 1.3201 0 0.8487 0.87 0 0.77
  [4,0,0.73,0,0.34,0.91,0,0.05,1.3201,0,0.8487,0.87,0,0.77],
// 4 0 0.53 0 0.58 0.73 0 0.34 0.87 0 0.77 0.46 0 0.8
  [4,0,0.53,0,0.58,0.73,0,0.34,0.87,0,0.77,0.46,0,0.8],
// 3 0 3.4317 0 0.9849 3.33 0 0.2706 3.6039 0 0.794
  [3,0,3.4317,0,0.9849,3.33,0,0.2706,3.6039,0,0.794],
// 3 0 3.6039 0 0.794 3.33 0 0.2706 3.9661 0 0.5531
  [3,0,3.6039,0,0.794,3.33,0,0.2706,3.9661,0,0.5531],
// 4 0 2.73 0 0.2706 3.03 0 0.351 2.1913 0 1.2449 1.7819 0 1.0331
  [4,0,2.73,0,0.2706,3.03,0,0.351,2.1913,0,1.2449,1.7819,0,1.0331],
// 4 0 2.49 0 1.51 2.1913 0 1.2449 3.784 0 1.362 2.79 0 1.75
  [4,0,2.49,0,1.51,2.1913,0,1.2449,3.784,0,1.362,2.79,0,1.75],
// 4 0 3.04 0 1.9 2.79 0 1.75 3.784 0 1.362 3.27 0 1.98
  [4,0,3.04,0,1.9,2.79,0,1.75,3.784,0,1.362,3.27,0,1.98],
// 3 0 3.27 0 1.98 3.784 0 1.362 4.2 0 1.49
  [3,0,3.27,0,1.98,3.784,0,1.362,4.2,0,1.49],
// 4 0 3.27 0 1.98 4.2 0 1.49 4.63 0 1.58 3.39 0 2.17
  [4,0,3.27,0,1.98,4.2,0,1.49,4.63,0,1.58,3.39,0,2.17],
// 4 14 3.27 0 1.98 3.39 0 2.17 3.14 0 2.53 3.04 0 1.9
  [4,14,3.27,0,1.98,3.39,0,2.17,3.14,0,2.53,3.04,0,1.9],
// 4 0 3.14 0 2.53 3.39 0 2.17 4.63 0 1.58 5.1 0 1.63
  [4,0,3.14,0,2.53,3.39,0,2.17,4.63,0,1.58,5.1,0,1.63],
// 4 0 -3.23 0 2.26 -3.94 0 1.53 -3.6 0 1.32 -3.12 0 2.01
  [4,0,-3.23,0,2.26,-3.94,0,1.53,-3.6,0,1.32,-3.12,0,2.01],
// 4 0 -4.43 0 1.69 -3.94 0 1.53 -3.23 0 2.26 -4.99 0 2.15
  [4,0,-4.43,0,1.69,-3.94,0,1.53,-3.23,0,2.26,-4.99,0,2.15],
// 4 0 -5 0 1.74 -4.43 0 1.69 -4.99 0 2.15 -5.18 0 2.09
  [4,0,-5,0,1.74,-4.43,0,1.69,-4.99,0,2.15,-5.18,0,2.09],
// 3 0 5.61 0 1.81 5.52 0 1.64 5.76 0 1.6
  [3,0,5.61,0,1.81,5.52,0,1.64,5.76,0,1.6],
// 4 0 5.1 0 1.63 5.52 0 1.64 5.61 0 1.81 5.28 0 1.97
  [4,0,5.1,0,1.63,5.52,0,1.64,5.61,0,1.81,5.28,0,1.97],
// 4 0 5.1 0 1.63 5.28 0 1.97 5.195 0 2.245 3.14 0 2.53
  [4,0,5.1,0,1.63,5.28,0,1.97,5.195,0,2.245,3.14,0,2.53],
// 4 14 5.28 0 1.97 5.61 0 1.81 6.49 0 2.54 5.195 0 2.245
  [4,14,5.28,0,1.97,5.61,0,1.81,6.49,0,2.54,5.195,0,2.245],
// 4 14 6.49 0 2.54 5.61 0 1.81 5.76 0 1.6 6.96 0 1.46
  [4,14,6.49,0,2.54,5.61,0,1.81,5.76,0,1.6,6.96,0,1.46],
// 4 14 4.63 0 1.58 4.2 0 1.49 3.9661 0 0.5531 4.1639 0 0.1657
  [4,14,4.63,0,1.58,4.2,0,1.49,3.9661,0,0.5531,4.1639,0,0.1657],
// 4 14 5.1 0 1.63 4.63 0 1.58 4.1639 0 0.1657 4.28 0 -0.24
  [4,14,5.1,0,1.63,4.63,0,1.58,4.1639,0,0.1657,4.28,0,-0.24],
// 4 14 5.52 0 1.64 5.1 0 1.63 4.28 0 -0.24 5.76 0 1.6
  [4,14,5.52,0,1.64,5.1,0,1.63,4.28,0,-0.24,5.76,0,1.6],
// 3 14 5.76 0 1.6 4.28 0 -0.24 6.96 0 1.46
  [3,14,5.76,0,1.6,4.28,0,-0.24,6.96,0,1.46],
// 4 0 -0.47 0 0.59 -0.37 0 0.82 -0.56 0 0.8 -0.62 0 0.3
  [4,0,-0.47,0,0.59,-0.37,0,0.82,-0.56,0,0.8,-0.62,0,0.3],
// 4 0 -0.62 0 0.3 -0.56 0 0.8 -0.9 0 0.81 -0.82 0 0.12
  [4,0,-0.62,0,0.3,-0.56,0,0.8,-0.9,0,0.81,-0.82,0,0.12],
// 3 0 -0.9 0 0.81 -1.12 0 -0.08 -0.82 0 0.12
  [3,0,-0.9,0,0.81,-1.12,0,-0.08,-0.82,0,0.12],
// 4 14 -3.09 0 2.49 -3.23 0 2.26 -3.12 0 2.01 -2.829 0 1.861
  [4,14,-3.09,0,2.49,-3.23,0,2.26,-3.12,0,2.01,-2.829,0,1.861],
// 4 0 -3.6 0 1.32 -3.3617 0 1.0749 -2.829 0 1.861 -3.12 0 2.01
  [4,0,-3.6,0,1.32,-3.3617,0,1.0749,-2.829,0,1.861,-3.12,0,2.01],
// 4 0 -3.09 0 2.49 -5.31 0 2.51 -4.99 0 2.15 -3.23 0 2.26
  [4,0,-3.09,0,2.49,-5.31,0,2.51,-4.99,0,2.15,-3.23,0,2.26],
// 4 14 -5.31 0 2.51 -6.49 0 2.52 -5.18 0 2.09 -4.99 0 2.15
  [4,14,-5.31,0,2.51,-6.49,0,2.52,-5.18,0,2.09,-4.99,0,2.15],
// 4 14 -5.45 0 1.95 -5.18 0 2.09 -6.49 0 2.52 -6.96 0 1.46
  [4,14,-5.45,0,1.95,-5.18,0,2.09,-6.49,0,2.52,-6.96,0,1.46],
// 4 14 -5.61 0 1.66 -5.45 0 1.95 -6.96 0 1.46 -7.12 0 0.07
  [4,14,-5.61,0,1.66,-5.45,0,1.95,-6.96,0,1.46,-7.12,0,0.07],
// 4 14 -5 0 1.74 -5.61 0 1.66 -7.12 0 0.07 -4.1139 0 0.1557
  [4,14,-5,0,1.74,-5.61,0,1.66,-7.12,0,0.07,-4.1139,0,0.1557],
// 4 14 -4.43 0 1.69 -5 0 1.74 -3.9261 0 0.5631 -3.6439 0 0.864
  [4,14,-4.43,0,1.69,-5,0,1.74,-3.9261,0,0.5631,-3.6439,0,0.864],
// 4 14 -3.94 0 1.53 -4.43 0 1.69 -3.6439 0 0.864 -3.6 0 1.32
  [4,14,-3.94,0,1.53,-4.43,0,1.69,-3.6439,0,0.864,-3.6,0,1.32],
// 3 14 -3.6 0 1.32 -3.6439 0 0.864 -3.3617 0 1.0749
  [3,14,-3.6,0,1.32,-3.6439,0,0.864,-3.3617,0,1.0749],
// 3 14 -5 0 1.74 -4.1139 0 0.1557 -3.9261 0 0.5631
  [3,14,-5,0,1.74,-4.1139,0,0.1557,-3.9261,0,0.5631],
// 3 14 -4.1139 0 0.1557 -7.12 0 0.07 -4.2 0 -0.27
  [3,14,-4.1139,0,0.1557,-7.12,0,0.07,-4.2,0,-0.27],
// 3 14 -7.12 0 0.07 -4.1349 0 -0.7727 -4.2 0 -0.27
  [3,14,-7.12,0,0.07,-4.1349,0,-0.7727,-4.2,0,-0.27],
// 4 14 1.19 0 -0.17 0.91 0 0.05 -1.7951 0 -0.7137 1.8451 0 -0.7637
  [4,14,1.19,0,-0.17,0.91,0,0.05,-1.7951,0,-0.7137,1.8451,0,-0.7637],
// 3 14 1.19 0 -0.17 1.8451 0 -0.7637 1.51 0 -0.31
  [3,14,1.19,0,-0.17,1.8451,0,-0.7637,1.51,0,-0.31],
// 4 14 -0.82 0 0.12 -1.12 0 -0.08 0.91 0 0.05 0.73 0 0.34
  [4,14,-0.82,0,0.12,-1.12,0,-0.08,0.91,0,0.05,0.73,0,0.34],
// 3 14 0.73 0 0.34 -0.62 0 0.3 -0.82 0 0.12
  [3,14,0.73,0,0.34,-0.62,0,0.3,-0.82,0,0.12],
// 4 14 -0.47 0 0.59 -0.62 0 0.3 0.73 0 0.34 0.53 0 0.58
  [4,14,-0.47,0,0.59,-0.62,0,0.3,0.73,0,0.34,0.53,0,0.58],
// 4 14 -0.47 0 0.59 0.53 0 0.58 0.46 0 0.8 -0.37 0 0.82
  [4,14,-0.47,0,0.59,0.53,0,0.58,0.46,0,0.8,-0.37,0,0.82],
// 4 14 3.14 0 2.53 -0.37 0 0.82 0.46 0 0.8 2.1913 0 1.2449
  [4,14,3.14,0,2.53,-0.37,0,0.82,0.46,0,0.8,2.1913,0,1.2449],
// 4 0 -5.45 0 1.95 -5.61 0 1.66 -5 0 1.74 -5.18 0 2.09
  [4,0,-5.45,0,1.95,-5.61,0,1.66,-5,0,1.74,-5.18,0,2.09],
// 4 14 3.5578 0 1.1834 3.4317 0 0.9849 3.6039 0 0.794 3.784 0 1.362
  [4,14,3.5578,0,1.1834,3.4317,0,0.9849,3.6039,0,0.794,3.784,0,1.362],
// 3 0 2.1913 0 1.2449 3.4317 0 0.9849 3.5578 0 1.1834
  [3,0,2.1913,0,1.2449,3.4317,0,0.9849,3.5578,0,1.1834],
// 3 0 3.784 0 1.362 2.1913 0 1.2449 3.5578 0 1.1834
  [3,0,3.784,0,1.362,2.1913,0,1.2449,3.5578,0,1.1834],
// 3 14 6.49 0 2.54 5.43 0 2.54 5.195 0 2.245
  [3,14,6.49,0,2.54,5.43,0,2.54,5.195,0,2.245],
// 4 14 0.46 0 0.8 0.87 0 0.77 1.3201 0 0.8487 1.7819 0 1.0331
  [4,14,0.46,0,0.8,0.87,0,0.77,1.3201,0,0.8487,1.7819,0,1.0331],
// 3 14 2.1913 0 1.2449 0.46 0 0.8 1.7819 0 1.0331
  [3,14,2.1913,0,1.2449,0.46,0,0.8,1.7819,0,1.0331],
// 3 14 3.14 0 2.53 2.1913 0 1.2449 2.49 0 1.51
  [3,14,3.14,0,2.53,2.1913,0,1.2449,2.49,0,1.51],
// 3 14 3.14 0 2.53 2.49 0 1.51 2.79 0 1.75
  [3,14,3.14,0,2.53,2.49,0,1.51,2.79,0,1.75],
// 3 14 3.14 0 2.53 2.79 0 1.75 3.04 0 1.9
  [3,14,3.14,0,2.53,2.79,0,1.75,3.04,0,1.9],
// 3 0 -1.666 0 1.0759 -2.3904 0 0.061 -1.3301 0 0.8887
  [3,0,-1.666,0,1.0759,-2.3904,0,0.061,-1.3301,0,0.8887],
// 3 0 -1.9419 0 1.2531 -2.3904 0 0.061 -1.666 0 1.0759
  [3,0,-1.9419,0,1.2531,-2.3904,0,0.061,-1.666,0,1.0759],
// 3 14 -3.09 0 2.49 -1.666 0 1.0759 -1.3301 0 0.8887
  [3,14,-3.09,0,2.49,-1.666,0,1.0759,-1.3301,0,0.8887],
// 3 0 -2.829 0 1.861 -2.91 0 0.361 -2.5402 0 1.6929
  [3,0,-2.829,0,1.861,-2.91,0,0.361,-2.5402,0,1.6929],
// 3 14 -3.09 0 2.49 -2.5402 0 1.6929 -2.2313 0 1.4849
  [3,14,-3.09,0,2.49,-2.5402,0,1.6929,-2.2313,0,1.4849],
// 3 14 -3.09 0 2.49 -2.829 0 1.861 -2.5402 0 1.6929
  [3,14,-3.09,0,2.49,-2.829,0,1.861,-2.5402,0,1.6929],
];
makepoly(ldraw_lib__98138pn5(), line=0.2);
